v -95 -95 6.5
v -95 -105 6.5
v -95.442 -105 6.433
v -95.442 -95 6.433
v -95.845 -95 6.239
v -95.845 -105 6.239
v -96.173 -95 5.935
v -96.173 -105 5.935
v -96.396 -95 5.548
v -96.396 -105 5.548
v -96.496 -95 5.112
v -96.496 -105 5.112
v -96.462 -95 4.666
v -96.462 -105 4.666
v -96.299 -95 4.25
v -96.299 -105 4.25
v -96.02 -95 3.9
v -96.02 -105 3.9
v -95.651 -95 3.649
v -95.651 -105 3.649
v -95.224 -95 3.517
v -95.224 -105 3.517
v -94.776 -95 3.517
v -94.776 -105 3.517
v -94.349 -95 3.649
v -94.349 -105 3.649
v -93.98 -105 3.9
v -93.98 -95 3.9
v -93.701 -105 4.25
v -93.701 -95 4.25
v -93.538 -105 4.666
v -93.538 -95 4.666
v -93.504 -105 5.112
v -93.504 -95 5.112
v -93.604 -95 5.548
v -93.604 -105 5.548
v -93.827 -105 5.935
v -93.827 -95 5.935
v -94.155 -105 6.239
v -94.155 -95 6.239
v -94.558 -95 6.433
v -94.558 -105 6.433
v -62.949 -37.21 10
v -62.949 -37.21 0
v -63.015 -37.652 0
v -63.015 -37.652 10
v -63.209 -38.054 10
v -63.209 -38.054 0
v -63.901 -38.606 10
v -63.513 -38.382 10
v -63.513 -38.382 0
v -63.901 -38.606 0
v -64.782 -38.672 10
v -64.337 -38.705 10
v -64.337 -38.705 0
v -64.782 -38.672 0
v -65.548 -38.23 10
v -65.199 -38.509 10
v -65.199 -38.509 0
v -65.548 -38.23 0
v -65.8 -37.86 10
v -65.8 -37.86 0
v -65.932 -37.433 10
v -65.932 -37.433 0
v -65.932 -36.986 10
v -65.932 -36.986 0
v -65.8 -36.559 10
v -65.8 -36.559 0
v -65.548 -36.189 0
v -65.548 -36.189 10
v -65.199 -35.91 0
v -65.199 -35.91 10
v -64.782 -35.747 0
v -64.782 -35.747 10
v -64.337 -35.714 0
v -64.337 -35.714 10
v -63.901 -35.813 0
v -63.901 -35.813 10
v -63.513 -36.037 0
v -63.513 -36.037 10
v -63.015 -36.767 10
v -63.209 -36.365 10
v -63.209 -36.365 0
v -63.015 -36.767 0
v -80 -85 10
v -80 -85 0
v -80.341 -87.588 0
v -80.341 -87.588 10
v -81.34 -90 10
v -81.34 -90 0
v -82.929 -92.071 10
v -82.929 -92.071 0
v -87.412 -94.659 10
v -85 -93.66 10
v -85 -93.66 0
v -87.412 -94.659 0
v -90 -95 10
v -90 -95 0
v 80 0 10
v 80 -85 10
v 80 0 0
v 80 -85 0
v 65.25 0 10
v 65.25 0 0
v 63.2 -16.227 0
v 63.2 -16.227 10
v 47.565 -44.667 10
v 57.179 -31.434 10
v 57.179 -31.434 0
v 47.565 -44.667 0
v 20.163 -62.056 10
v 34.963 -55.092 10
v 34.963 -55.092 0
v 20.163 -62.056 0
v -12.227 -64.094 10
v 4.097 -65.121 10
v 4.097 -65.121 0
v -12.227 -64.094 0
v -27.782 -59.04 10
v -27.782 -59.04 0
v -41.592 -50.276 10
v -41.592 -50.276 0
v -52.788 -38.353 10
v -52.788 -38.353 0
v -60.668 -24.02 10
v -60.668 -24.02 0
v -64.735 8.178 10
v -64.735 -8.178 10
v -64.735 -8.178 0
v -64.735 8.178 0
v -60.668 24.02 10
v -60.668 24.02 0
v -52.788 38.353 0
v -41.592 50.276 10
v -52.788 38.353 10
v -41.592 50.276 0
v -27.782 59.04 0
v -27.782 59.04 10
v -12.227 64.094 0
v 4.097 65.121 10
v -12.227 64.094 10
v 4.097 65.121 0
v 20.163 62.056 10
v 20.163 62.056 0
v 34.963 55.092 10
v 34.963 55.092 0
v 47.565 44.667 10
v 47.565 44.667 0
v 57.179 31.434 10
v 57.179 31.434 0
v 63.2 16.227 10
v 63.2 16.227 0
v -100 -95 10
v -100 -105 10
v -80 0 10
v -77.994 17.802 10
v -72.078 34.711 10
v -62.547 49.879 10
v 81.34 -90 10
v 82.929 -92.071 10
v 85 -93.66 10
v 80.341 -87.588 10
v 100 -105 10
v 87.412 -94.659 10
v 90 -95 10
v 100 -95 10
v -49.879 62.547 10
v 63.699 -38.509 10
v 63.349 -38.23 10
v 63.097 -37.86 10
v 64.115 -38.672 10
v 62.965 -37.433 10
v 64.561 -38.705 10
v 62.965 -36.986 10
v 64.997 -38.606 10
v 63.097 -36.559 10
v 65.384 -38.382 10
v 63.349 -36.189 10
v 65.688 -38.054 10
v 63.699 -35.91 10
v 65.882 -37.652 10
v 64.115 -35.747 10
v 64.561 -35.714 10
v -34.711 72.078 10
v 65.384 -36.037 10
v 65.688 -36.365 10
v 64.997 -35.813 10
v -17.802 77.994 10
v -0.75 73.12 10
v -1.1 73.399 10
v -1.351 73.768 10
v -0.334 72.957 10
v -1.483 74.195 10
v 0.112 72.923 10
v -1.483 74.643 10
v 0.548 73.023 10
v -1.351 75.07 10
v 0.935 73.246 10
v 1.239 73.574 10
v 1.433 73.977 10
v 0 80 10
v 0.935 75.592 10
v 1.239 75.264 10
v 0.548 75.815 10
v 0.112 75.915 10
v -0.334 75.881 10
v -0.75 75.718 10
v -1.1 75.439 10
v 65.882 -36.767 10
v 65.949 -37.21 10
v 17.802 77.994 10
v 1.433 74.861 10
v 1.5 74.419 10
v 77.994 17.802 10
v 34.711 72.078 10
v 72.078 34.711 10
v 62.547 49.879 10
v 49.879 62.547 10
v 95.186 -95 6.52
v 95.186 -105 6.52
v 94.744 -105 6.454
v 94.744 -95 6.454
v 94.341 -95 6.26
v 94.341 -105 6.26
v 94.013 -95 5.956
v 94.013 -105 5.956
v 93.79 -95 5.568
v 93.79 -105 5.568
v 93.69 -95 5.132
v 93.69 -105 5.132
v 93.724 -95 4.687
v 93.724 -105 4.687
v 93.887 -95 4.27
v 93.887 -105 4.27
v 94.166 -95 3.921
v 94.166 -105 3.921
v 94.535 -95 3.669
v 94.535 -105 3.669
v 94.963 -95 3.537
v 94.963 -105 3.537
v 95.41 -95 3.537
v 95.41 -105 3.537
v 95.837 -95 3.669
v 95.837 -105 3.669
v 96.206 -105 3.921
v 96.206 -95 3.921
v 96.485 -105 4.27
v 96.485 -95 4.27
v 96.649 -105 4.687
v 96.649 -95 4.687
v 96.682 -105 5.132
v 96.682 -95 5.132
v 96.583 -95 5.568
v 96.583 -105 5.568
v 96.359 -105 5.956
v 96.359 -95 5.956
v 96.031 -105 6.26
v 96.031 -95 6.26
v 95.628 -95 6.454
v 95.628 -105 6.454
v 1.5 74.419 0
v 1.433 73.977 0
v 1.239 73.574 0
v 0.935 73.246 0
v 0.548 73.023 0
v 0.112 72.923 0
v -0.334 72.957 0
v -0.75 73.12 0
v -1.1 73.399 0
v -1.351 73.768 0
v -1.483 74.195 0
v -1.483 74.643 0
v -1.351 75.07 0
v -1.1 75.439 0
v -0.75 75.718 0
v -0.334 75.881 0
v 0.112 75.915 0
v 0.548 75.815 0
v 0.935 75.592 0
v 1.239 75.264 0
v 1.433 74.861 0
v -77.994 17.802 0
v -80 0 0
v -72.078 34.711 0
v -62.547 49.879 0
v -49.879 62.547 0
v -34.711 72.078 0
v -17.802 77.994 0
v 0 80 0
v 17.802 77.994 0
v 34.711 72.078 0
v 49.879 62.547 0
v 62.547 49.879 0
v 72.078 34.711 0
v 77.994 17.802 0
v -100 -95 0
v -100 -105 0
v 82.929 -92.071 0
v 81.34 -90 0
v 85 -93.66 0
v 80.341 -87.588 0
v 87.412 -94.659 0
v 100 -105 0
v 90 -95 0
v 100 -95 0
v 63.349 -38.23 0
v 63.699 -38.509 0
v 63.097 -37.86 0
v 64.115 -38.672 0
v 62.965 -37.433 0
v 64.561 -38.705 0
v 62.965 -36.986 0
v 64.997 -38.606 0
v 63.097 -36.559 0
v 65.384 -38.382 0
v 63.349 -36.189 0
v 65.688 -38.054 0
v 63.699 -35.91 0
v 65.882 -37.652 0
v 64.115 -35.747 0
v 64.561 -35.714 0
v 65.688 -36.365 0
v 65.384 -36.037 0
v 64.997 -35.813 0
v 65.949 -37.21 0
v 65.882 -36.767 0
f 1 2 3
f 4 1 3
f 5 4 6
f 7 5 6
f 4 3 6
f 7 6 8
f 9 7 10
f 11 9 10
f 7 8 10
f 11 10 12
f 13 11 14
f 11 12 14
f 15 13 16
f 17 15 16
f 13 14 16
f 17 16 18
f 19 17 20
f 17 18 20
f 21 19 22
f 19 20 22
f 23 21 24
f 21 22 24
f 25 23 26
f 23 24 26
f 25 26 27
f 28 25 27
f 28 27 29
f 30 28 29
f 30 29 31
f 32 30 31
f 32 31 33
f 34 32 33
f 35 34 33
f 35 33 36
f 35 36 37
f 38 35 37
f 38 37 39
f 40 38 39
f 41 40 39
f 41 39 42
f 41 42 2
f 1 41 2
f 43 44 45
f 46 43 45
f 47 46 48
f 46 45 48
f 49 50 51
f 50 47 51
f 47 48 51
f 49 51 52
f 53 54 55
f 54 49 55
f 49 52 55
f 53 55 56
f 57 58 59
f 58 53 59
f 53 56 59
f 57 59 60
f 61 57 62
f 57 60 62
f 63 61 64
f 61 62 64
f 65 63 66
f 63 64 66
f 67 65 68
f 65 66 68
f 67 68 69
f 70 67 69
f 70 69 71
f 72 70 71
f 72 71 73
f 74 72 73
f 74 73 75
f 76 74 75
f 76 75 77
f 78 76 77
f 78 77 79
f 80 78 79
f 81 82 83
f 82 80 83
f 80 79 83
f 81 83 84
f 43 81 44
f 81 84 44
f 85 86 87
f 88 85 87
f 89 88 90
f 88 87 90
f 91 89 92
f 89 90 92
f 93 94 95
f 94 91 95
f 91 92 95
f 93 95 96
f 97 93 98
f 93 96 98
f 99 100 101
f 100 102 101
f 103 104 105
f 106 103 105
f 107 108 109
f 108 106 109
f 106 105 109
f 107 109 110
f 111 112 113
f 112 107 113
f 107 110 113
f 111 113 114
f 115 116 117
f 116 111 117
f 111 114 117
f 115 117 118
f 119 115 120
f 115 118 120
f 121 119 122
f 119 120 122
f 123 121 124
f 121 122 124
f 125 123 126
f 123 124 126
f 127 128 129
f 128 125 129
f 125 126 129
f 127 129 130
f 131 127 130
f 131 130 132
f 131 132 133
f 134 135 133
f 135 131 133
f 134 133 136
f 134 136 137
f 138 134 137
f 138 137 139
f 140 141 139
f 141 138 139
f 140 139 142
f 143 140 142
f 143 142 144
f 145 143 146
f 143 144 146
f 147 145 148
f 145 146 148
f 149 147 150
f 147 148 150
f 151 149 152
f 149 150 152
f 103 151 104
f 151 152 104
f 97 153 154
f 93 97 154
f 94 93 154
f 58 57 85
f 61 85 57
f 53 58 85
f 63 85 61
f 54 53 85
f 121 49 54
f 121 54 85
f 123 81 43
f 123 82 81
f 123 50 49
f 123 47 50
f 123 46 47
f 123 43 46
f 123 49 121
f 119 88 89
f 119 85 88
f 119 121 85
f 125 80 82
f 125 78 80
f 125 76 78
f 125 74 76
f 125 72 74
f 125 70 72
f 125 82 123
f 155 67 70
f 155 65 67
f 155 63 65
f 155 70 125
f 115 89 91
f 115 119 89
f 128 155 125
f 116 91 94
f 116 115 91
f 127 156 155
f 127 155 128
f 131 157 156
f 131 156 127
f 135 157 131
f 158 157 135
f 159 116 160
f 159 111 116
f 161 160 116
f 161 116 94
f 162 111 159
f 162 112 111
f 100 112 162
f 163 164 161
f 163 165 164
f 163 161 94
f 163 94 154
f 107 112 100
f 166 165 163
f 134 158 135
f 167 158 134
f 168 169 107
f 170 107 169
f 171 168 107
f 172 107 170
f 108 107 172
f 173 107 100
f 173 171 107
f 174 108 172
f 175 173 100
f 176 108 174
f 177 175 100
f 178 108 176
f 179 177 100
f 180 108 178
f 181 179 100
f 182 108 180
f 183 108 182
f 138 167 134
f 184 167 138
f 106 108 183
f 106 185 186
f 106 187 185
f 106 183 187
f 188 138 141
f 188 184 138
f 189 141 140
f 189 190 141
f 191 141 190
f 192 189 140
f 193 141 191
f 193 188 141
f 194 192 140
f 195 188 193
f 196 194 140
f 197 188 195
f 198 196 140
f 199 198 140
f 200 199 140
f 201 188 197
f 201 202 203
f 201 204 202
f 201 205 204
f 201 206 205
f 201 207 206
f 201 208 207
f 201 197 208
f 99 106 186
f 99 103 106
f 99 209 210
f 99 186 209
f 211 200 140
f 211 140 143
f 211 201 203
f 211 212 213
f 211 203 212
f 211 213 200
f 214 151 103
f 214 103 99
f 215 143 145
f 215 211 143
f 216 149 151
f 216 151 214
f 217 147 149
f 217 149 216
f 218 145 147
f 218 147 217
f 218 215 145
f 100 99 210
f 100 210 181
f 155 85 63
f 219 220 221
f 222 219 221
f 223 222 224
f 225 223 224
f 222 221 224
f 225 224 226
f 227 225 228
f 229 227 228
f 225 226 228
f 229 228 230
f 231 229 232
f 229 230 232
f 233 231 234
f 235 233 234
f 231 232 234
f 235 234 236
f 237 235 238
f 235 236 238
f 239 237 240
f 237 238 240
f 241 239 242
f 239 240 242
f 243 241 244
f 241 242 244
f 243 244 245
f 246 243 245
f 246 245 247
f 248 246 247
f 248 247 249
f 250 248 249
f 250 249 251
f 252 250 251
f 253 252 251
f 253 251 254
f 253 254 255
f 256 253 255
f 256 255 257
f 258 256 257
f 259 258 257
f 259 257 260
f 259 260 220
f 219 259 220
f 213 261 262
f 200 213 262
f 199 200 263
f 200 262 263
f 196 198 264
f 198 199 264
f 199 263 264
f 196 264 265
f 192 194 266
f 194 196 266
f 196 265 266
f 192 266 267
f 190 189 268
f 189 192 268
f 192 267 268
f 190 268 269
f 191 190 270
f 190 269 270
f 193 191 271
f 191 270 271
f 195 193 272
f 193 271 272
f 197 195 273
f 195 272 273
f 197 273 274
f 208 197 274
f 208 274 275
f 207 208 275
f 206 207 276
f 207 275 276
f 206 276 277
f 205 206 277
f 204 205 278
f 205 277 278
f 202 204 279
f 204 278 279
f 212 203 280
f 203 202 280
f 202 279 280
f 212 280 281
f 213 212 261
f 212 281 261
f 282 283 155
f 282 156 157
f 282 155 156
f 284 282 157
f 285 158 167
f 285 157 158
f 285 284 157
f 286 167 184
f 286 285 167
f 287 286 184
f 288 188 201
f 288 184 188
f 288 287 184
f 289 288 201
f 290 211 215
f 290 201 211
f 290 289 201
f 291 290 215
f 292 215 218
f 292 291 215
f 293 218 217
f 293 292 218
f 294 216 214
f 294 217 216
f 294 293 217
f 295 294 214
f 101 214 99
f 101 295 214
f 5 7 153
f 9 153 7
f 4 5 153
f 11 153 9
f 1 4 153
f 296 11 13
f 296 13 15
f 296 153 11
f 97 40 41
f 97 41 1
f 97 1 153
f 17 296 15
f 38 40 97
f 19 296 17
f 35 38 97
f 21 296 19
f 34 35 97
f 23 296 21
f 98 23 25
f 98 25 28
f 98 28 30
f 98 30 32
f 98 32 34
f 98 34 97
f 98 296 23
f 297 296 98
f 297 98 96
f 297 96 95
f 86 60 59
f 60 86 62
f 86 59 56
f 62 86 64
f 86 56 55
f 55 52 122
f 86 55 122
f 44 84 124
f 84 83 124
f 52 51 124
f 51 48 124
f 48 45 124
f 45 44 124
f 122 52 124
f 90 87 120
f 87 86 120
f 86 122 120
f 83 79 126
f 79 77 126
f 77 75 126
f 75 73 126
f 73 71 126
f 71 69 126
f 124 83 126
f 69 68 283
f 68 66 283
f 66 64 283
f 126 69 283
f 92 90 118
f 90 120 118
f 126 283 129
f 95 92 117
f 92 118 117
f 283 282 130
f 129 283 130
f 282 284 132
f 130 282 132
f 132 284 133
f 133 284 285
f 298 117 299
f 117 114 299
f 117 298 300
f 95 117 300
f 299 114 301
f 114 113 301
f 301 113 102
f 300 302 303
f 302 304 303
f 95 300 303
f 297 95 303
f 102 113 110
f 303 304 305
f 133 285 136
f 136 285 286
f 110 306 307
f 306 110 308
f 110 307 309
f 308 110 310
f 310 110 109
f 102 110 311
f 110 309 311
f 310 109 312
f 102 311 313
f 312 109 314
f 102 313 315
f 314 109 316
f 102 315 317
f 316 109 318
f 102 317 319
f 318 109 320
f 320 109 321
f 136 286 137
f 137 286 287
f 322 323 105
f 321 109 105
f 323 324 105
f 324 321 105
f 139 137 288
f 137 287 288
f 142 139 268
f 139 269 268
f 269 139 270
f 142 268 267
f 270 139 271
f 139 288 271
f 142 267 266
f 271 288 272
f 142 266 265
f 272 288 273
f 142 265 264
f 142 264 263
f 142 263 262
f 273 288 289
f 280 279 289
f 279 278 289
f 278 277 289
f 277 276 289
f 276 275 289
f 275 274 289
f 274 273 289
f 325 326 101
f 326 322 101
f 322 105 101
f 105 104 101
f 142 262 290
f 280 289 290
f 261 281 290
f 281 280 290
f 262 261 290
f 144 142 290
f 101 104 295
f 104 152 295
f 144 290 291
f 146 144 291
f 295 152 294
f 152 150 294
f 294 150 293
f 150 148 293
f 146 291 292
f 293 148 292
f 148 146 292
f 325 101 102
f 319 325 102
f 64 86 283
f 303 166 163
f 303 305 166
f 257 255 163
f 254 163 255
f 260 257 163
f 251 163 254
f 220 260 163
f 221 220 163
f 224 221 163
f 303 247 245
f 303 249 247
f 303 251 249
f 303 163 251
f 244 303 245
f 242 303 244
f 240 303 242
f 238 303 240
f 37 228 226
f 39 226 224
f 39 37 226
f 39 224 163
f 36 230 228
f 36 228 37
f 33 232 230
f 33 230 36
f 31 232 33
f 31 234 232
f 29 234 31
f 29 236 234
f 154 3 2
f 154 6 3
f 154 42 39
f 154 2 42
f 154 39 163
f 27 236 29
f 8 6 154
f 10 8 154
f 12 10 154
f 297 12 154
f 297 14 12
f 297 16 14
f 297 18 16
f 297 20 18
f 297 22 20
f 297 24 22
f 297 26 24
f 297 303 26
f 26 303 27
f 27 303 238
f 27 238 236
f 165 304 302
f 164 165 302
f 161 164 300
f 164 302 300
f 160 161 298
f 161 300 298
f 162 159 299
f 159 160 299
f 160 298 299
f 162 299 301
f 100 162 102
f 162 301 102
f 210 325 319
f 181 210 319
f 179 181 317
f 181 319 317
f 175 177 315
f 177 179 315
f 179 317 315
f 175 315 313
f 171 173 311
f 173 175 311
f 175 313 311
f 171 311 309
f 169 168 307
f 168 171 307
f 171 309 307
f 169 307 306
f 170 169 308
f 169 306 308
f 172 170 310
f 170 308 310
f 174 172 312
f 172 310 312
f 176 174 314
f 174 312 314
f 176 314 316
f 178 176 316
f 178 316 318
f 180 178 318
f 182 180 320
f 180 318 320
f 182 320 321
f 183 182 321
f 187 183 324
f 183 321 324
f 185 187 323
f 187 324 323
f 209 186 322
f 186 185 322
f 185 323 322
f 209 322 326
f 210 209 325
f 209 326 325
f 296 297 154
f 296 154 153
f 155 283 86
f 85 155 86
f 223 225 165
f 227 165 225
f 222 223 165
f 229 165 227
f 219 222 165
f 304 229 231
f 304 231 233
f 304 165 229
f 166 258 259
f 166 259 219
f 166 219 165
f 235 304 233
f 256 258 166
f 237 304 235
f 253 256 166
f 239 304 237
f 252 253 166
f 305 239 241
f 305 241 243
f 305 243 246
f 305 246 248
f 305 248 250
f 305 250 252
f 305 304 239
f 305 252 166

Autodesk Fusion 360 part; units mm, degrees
sketch "Sketch1" plane through (0, 0, 0) normal (0, 0, 1) x (1, 0, 0)
  circle A0 centre (0, 0) radius 65.25
  circle A1 centre (0, 0) radius 74.419 construction
  circle A2 centre (0, 74.419) radius 1.5
  circle A3 centre (-64.4487, -37.2095) radius 1.5
  circle A4 centre (64.4487, -37.2095) radius 1.5
  circle A5 centre (0, 0) radius 80
  line L0 (-80, 0) -> (80, 0) construction
  line L1 (-80, 0) -> (-80, -85)
  line L2 (80, -85) -> (80, 0)
  line L3 (-80, -95) -> (-100, -95) construction
  line L4 (-100, -95) -> (-90, -95)
  line L5 (100, -95) -> (100, -105)
  line L6 (100, -105) -> (-100, -105)
  line L7 (-100, -105) -> (-100, -95)
  arc A6 (-90, -95) -> (-80, -85) centre (-90, -85) ccw
  line L8 (90, -95) -> (100, -95)
  arc A7 (80, -85) -> (90, -95) centre (90, -85) ccw
  line L9 (-100, -100) -> (-30, -100) construction
  line L10 (-100, -100) -> (40, -100) construction
  circle A8 centre (-30, -100) radius 1.5
  circle A9 centre (40, -100) radius 1.5
  dimension "d1" = 130.5
  dimension "d4" = 148.838
  dimension "d5" = 3
  dimension "d7" = 360
  dimension "d8" = 160
  dimension "d10" = 200
  dimension "d11" = 10
  dimension "d12" = 10
  dimension "d13" = 10
  dimension "d22" = 105
  dimension "d24" = 70
  dimension "d25" = 140
  dimension "d26" = 3
  dimension "d27" = 3
extrude "Extrude1" add sketch "Sketch1" along normal blind 10 contours A5 | A5 L1 L2 L4 L5 L6 L7 A6 L8 A7 | A8 | A9
hole "Hole1" at (-95, -95, 5) direction (0, -1, 0) diameter 3 depth 10 tip angle 118
hole "Hole2" at (95.1862, -95, 5.0204) direction (0, -1, 0) diameter 3 depth 10 tip angle 118
equation "d1 = GearboxDia + Tollerance"
equation "GearboxDia = 130 mm"
equation "Tollerance = 0.5 mm"
equation "d4 = ( 74.419 * 2 ) * 1 mm"
equation "d8 = GearboxDia + 30 mm"
equation "d10 = d8 + 40 mm"
equation "d22 = AxleHieght"
equation "AxleHieght = 105 mm"
equation "d24 = ( 210 / 3 ) * 1 mm"
equation "d25 = ( 210 / 3 * 2 ) * 1 mm"
